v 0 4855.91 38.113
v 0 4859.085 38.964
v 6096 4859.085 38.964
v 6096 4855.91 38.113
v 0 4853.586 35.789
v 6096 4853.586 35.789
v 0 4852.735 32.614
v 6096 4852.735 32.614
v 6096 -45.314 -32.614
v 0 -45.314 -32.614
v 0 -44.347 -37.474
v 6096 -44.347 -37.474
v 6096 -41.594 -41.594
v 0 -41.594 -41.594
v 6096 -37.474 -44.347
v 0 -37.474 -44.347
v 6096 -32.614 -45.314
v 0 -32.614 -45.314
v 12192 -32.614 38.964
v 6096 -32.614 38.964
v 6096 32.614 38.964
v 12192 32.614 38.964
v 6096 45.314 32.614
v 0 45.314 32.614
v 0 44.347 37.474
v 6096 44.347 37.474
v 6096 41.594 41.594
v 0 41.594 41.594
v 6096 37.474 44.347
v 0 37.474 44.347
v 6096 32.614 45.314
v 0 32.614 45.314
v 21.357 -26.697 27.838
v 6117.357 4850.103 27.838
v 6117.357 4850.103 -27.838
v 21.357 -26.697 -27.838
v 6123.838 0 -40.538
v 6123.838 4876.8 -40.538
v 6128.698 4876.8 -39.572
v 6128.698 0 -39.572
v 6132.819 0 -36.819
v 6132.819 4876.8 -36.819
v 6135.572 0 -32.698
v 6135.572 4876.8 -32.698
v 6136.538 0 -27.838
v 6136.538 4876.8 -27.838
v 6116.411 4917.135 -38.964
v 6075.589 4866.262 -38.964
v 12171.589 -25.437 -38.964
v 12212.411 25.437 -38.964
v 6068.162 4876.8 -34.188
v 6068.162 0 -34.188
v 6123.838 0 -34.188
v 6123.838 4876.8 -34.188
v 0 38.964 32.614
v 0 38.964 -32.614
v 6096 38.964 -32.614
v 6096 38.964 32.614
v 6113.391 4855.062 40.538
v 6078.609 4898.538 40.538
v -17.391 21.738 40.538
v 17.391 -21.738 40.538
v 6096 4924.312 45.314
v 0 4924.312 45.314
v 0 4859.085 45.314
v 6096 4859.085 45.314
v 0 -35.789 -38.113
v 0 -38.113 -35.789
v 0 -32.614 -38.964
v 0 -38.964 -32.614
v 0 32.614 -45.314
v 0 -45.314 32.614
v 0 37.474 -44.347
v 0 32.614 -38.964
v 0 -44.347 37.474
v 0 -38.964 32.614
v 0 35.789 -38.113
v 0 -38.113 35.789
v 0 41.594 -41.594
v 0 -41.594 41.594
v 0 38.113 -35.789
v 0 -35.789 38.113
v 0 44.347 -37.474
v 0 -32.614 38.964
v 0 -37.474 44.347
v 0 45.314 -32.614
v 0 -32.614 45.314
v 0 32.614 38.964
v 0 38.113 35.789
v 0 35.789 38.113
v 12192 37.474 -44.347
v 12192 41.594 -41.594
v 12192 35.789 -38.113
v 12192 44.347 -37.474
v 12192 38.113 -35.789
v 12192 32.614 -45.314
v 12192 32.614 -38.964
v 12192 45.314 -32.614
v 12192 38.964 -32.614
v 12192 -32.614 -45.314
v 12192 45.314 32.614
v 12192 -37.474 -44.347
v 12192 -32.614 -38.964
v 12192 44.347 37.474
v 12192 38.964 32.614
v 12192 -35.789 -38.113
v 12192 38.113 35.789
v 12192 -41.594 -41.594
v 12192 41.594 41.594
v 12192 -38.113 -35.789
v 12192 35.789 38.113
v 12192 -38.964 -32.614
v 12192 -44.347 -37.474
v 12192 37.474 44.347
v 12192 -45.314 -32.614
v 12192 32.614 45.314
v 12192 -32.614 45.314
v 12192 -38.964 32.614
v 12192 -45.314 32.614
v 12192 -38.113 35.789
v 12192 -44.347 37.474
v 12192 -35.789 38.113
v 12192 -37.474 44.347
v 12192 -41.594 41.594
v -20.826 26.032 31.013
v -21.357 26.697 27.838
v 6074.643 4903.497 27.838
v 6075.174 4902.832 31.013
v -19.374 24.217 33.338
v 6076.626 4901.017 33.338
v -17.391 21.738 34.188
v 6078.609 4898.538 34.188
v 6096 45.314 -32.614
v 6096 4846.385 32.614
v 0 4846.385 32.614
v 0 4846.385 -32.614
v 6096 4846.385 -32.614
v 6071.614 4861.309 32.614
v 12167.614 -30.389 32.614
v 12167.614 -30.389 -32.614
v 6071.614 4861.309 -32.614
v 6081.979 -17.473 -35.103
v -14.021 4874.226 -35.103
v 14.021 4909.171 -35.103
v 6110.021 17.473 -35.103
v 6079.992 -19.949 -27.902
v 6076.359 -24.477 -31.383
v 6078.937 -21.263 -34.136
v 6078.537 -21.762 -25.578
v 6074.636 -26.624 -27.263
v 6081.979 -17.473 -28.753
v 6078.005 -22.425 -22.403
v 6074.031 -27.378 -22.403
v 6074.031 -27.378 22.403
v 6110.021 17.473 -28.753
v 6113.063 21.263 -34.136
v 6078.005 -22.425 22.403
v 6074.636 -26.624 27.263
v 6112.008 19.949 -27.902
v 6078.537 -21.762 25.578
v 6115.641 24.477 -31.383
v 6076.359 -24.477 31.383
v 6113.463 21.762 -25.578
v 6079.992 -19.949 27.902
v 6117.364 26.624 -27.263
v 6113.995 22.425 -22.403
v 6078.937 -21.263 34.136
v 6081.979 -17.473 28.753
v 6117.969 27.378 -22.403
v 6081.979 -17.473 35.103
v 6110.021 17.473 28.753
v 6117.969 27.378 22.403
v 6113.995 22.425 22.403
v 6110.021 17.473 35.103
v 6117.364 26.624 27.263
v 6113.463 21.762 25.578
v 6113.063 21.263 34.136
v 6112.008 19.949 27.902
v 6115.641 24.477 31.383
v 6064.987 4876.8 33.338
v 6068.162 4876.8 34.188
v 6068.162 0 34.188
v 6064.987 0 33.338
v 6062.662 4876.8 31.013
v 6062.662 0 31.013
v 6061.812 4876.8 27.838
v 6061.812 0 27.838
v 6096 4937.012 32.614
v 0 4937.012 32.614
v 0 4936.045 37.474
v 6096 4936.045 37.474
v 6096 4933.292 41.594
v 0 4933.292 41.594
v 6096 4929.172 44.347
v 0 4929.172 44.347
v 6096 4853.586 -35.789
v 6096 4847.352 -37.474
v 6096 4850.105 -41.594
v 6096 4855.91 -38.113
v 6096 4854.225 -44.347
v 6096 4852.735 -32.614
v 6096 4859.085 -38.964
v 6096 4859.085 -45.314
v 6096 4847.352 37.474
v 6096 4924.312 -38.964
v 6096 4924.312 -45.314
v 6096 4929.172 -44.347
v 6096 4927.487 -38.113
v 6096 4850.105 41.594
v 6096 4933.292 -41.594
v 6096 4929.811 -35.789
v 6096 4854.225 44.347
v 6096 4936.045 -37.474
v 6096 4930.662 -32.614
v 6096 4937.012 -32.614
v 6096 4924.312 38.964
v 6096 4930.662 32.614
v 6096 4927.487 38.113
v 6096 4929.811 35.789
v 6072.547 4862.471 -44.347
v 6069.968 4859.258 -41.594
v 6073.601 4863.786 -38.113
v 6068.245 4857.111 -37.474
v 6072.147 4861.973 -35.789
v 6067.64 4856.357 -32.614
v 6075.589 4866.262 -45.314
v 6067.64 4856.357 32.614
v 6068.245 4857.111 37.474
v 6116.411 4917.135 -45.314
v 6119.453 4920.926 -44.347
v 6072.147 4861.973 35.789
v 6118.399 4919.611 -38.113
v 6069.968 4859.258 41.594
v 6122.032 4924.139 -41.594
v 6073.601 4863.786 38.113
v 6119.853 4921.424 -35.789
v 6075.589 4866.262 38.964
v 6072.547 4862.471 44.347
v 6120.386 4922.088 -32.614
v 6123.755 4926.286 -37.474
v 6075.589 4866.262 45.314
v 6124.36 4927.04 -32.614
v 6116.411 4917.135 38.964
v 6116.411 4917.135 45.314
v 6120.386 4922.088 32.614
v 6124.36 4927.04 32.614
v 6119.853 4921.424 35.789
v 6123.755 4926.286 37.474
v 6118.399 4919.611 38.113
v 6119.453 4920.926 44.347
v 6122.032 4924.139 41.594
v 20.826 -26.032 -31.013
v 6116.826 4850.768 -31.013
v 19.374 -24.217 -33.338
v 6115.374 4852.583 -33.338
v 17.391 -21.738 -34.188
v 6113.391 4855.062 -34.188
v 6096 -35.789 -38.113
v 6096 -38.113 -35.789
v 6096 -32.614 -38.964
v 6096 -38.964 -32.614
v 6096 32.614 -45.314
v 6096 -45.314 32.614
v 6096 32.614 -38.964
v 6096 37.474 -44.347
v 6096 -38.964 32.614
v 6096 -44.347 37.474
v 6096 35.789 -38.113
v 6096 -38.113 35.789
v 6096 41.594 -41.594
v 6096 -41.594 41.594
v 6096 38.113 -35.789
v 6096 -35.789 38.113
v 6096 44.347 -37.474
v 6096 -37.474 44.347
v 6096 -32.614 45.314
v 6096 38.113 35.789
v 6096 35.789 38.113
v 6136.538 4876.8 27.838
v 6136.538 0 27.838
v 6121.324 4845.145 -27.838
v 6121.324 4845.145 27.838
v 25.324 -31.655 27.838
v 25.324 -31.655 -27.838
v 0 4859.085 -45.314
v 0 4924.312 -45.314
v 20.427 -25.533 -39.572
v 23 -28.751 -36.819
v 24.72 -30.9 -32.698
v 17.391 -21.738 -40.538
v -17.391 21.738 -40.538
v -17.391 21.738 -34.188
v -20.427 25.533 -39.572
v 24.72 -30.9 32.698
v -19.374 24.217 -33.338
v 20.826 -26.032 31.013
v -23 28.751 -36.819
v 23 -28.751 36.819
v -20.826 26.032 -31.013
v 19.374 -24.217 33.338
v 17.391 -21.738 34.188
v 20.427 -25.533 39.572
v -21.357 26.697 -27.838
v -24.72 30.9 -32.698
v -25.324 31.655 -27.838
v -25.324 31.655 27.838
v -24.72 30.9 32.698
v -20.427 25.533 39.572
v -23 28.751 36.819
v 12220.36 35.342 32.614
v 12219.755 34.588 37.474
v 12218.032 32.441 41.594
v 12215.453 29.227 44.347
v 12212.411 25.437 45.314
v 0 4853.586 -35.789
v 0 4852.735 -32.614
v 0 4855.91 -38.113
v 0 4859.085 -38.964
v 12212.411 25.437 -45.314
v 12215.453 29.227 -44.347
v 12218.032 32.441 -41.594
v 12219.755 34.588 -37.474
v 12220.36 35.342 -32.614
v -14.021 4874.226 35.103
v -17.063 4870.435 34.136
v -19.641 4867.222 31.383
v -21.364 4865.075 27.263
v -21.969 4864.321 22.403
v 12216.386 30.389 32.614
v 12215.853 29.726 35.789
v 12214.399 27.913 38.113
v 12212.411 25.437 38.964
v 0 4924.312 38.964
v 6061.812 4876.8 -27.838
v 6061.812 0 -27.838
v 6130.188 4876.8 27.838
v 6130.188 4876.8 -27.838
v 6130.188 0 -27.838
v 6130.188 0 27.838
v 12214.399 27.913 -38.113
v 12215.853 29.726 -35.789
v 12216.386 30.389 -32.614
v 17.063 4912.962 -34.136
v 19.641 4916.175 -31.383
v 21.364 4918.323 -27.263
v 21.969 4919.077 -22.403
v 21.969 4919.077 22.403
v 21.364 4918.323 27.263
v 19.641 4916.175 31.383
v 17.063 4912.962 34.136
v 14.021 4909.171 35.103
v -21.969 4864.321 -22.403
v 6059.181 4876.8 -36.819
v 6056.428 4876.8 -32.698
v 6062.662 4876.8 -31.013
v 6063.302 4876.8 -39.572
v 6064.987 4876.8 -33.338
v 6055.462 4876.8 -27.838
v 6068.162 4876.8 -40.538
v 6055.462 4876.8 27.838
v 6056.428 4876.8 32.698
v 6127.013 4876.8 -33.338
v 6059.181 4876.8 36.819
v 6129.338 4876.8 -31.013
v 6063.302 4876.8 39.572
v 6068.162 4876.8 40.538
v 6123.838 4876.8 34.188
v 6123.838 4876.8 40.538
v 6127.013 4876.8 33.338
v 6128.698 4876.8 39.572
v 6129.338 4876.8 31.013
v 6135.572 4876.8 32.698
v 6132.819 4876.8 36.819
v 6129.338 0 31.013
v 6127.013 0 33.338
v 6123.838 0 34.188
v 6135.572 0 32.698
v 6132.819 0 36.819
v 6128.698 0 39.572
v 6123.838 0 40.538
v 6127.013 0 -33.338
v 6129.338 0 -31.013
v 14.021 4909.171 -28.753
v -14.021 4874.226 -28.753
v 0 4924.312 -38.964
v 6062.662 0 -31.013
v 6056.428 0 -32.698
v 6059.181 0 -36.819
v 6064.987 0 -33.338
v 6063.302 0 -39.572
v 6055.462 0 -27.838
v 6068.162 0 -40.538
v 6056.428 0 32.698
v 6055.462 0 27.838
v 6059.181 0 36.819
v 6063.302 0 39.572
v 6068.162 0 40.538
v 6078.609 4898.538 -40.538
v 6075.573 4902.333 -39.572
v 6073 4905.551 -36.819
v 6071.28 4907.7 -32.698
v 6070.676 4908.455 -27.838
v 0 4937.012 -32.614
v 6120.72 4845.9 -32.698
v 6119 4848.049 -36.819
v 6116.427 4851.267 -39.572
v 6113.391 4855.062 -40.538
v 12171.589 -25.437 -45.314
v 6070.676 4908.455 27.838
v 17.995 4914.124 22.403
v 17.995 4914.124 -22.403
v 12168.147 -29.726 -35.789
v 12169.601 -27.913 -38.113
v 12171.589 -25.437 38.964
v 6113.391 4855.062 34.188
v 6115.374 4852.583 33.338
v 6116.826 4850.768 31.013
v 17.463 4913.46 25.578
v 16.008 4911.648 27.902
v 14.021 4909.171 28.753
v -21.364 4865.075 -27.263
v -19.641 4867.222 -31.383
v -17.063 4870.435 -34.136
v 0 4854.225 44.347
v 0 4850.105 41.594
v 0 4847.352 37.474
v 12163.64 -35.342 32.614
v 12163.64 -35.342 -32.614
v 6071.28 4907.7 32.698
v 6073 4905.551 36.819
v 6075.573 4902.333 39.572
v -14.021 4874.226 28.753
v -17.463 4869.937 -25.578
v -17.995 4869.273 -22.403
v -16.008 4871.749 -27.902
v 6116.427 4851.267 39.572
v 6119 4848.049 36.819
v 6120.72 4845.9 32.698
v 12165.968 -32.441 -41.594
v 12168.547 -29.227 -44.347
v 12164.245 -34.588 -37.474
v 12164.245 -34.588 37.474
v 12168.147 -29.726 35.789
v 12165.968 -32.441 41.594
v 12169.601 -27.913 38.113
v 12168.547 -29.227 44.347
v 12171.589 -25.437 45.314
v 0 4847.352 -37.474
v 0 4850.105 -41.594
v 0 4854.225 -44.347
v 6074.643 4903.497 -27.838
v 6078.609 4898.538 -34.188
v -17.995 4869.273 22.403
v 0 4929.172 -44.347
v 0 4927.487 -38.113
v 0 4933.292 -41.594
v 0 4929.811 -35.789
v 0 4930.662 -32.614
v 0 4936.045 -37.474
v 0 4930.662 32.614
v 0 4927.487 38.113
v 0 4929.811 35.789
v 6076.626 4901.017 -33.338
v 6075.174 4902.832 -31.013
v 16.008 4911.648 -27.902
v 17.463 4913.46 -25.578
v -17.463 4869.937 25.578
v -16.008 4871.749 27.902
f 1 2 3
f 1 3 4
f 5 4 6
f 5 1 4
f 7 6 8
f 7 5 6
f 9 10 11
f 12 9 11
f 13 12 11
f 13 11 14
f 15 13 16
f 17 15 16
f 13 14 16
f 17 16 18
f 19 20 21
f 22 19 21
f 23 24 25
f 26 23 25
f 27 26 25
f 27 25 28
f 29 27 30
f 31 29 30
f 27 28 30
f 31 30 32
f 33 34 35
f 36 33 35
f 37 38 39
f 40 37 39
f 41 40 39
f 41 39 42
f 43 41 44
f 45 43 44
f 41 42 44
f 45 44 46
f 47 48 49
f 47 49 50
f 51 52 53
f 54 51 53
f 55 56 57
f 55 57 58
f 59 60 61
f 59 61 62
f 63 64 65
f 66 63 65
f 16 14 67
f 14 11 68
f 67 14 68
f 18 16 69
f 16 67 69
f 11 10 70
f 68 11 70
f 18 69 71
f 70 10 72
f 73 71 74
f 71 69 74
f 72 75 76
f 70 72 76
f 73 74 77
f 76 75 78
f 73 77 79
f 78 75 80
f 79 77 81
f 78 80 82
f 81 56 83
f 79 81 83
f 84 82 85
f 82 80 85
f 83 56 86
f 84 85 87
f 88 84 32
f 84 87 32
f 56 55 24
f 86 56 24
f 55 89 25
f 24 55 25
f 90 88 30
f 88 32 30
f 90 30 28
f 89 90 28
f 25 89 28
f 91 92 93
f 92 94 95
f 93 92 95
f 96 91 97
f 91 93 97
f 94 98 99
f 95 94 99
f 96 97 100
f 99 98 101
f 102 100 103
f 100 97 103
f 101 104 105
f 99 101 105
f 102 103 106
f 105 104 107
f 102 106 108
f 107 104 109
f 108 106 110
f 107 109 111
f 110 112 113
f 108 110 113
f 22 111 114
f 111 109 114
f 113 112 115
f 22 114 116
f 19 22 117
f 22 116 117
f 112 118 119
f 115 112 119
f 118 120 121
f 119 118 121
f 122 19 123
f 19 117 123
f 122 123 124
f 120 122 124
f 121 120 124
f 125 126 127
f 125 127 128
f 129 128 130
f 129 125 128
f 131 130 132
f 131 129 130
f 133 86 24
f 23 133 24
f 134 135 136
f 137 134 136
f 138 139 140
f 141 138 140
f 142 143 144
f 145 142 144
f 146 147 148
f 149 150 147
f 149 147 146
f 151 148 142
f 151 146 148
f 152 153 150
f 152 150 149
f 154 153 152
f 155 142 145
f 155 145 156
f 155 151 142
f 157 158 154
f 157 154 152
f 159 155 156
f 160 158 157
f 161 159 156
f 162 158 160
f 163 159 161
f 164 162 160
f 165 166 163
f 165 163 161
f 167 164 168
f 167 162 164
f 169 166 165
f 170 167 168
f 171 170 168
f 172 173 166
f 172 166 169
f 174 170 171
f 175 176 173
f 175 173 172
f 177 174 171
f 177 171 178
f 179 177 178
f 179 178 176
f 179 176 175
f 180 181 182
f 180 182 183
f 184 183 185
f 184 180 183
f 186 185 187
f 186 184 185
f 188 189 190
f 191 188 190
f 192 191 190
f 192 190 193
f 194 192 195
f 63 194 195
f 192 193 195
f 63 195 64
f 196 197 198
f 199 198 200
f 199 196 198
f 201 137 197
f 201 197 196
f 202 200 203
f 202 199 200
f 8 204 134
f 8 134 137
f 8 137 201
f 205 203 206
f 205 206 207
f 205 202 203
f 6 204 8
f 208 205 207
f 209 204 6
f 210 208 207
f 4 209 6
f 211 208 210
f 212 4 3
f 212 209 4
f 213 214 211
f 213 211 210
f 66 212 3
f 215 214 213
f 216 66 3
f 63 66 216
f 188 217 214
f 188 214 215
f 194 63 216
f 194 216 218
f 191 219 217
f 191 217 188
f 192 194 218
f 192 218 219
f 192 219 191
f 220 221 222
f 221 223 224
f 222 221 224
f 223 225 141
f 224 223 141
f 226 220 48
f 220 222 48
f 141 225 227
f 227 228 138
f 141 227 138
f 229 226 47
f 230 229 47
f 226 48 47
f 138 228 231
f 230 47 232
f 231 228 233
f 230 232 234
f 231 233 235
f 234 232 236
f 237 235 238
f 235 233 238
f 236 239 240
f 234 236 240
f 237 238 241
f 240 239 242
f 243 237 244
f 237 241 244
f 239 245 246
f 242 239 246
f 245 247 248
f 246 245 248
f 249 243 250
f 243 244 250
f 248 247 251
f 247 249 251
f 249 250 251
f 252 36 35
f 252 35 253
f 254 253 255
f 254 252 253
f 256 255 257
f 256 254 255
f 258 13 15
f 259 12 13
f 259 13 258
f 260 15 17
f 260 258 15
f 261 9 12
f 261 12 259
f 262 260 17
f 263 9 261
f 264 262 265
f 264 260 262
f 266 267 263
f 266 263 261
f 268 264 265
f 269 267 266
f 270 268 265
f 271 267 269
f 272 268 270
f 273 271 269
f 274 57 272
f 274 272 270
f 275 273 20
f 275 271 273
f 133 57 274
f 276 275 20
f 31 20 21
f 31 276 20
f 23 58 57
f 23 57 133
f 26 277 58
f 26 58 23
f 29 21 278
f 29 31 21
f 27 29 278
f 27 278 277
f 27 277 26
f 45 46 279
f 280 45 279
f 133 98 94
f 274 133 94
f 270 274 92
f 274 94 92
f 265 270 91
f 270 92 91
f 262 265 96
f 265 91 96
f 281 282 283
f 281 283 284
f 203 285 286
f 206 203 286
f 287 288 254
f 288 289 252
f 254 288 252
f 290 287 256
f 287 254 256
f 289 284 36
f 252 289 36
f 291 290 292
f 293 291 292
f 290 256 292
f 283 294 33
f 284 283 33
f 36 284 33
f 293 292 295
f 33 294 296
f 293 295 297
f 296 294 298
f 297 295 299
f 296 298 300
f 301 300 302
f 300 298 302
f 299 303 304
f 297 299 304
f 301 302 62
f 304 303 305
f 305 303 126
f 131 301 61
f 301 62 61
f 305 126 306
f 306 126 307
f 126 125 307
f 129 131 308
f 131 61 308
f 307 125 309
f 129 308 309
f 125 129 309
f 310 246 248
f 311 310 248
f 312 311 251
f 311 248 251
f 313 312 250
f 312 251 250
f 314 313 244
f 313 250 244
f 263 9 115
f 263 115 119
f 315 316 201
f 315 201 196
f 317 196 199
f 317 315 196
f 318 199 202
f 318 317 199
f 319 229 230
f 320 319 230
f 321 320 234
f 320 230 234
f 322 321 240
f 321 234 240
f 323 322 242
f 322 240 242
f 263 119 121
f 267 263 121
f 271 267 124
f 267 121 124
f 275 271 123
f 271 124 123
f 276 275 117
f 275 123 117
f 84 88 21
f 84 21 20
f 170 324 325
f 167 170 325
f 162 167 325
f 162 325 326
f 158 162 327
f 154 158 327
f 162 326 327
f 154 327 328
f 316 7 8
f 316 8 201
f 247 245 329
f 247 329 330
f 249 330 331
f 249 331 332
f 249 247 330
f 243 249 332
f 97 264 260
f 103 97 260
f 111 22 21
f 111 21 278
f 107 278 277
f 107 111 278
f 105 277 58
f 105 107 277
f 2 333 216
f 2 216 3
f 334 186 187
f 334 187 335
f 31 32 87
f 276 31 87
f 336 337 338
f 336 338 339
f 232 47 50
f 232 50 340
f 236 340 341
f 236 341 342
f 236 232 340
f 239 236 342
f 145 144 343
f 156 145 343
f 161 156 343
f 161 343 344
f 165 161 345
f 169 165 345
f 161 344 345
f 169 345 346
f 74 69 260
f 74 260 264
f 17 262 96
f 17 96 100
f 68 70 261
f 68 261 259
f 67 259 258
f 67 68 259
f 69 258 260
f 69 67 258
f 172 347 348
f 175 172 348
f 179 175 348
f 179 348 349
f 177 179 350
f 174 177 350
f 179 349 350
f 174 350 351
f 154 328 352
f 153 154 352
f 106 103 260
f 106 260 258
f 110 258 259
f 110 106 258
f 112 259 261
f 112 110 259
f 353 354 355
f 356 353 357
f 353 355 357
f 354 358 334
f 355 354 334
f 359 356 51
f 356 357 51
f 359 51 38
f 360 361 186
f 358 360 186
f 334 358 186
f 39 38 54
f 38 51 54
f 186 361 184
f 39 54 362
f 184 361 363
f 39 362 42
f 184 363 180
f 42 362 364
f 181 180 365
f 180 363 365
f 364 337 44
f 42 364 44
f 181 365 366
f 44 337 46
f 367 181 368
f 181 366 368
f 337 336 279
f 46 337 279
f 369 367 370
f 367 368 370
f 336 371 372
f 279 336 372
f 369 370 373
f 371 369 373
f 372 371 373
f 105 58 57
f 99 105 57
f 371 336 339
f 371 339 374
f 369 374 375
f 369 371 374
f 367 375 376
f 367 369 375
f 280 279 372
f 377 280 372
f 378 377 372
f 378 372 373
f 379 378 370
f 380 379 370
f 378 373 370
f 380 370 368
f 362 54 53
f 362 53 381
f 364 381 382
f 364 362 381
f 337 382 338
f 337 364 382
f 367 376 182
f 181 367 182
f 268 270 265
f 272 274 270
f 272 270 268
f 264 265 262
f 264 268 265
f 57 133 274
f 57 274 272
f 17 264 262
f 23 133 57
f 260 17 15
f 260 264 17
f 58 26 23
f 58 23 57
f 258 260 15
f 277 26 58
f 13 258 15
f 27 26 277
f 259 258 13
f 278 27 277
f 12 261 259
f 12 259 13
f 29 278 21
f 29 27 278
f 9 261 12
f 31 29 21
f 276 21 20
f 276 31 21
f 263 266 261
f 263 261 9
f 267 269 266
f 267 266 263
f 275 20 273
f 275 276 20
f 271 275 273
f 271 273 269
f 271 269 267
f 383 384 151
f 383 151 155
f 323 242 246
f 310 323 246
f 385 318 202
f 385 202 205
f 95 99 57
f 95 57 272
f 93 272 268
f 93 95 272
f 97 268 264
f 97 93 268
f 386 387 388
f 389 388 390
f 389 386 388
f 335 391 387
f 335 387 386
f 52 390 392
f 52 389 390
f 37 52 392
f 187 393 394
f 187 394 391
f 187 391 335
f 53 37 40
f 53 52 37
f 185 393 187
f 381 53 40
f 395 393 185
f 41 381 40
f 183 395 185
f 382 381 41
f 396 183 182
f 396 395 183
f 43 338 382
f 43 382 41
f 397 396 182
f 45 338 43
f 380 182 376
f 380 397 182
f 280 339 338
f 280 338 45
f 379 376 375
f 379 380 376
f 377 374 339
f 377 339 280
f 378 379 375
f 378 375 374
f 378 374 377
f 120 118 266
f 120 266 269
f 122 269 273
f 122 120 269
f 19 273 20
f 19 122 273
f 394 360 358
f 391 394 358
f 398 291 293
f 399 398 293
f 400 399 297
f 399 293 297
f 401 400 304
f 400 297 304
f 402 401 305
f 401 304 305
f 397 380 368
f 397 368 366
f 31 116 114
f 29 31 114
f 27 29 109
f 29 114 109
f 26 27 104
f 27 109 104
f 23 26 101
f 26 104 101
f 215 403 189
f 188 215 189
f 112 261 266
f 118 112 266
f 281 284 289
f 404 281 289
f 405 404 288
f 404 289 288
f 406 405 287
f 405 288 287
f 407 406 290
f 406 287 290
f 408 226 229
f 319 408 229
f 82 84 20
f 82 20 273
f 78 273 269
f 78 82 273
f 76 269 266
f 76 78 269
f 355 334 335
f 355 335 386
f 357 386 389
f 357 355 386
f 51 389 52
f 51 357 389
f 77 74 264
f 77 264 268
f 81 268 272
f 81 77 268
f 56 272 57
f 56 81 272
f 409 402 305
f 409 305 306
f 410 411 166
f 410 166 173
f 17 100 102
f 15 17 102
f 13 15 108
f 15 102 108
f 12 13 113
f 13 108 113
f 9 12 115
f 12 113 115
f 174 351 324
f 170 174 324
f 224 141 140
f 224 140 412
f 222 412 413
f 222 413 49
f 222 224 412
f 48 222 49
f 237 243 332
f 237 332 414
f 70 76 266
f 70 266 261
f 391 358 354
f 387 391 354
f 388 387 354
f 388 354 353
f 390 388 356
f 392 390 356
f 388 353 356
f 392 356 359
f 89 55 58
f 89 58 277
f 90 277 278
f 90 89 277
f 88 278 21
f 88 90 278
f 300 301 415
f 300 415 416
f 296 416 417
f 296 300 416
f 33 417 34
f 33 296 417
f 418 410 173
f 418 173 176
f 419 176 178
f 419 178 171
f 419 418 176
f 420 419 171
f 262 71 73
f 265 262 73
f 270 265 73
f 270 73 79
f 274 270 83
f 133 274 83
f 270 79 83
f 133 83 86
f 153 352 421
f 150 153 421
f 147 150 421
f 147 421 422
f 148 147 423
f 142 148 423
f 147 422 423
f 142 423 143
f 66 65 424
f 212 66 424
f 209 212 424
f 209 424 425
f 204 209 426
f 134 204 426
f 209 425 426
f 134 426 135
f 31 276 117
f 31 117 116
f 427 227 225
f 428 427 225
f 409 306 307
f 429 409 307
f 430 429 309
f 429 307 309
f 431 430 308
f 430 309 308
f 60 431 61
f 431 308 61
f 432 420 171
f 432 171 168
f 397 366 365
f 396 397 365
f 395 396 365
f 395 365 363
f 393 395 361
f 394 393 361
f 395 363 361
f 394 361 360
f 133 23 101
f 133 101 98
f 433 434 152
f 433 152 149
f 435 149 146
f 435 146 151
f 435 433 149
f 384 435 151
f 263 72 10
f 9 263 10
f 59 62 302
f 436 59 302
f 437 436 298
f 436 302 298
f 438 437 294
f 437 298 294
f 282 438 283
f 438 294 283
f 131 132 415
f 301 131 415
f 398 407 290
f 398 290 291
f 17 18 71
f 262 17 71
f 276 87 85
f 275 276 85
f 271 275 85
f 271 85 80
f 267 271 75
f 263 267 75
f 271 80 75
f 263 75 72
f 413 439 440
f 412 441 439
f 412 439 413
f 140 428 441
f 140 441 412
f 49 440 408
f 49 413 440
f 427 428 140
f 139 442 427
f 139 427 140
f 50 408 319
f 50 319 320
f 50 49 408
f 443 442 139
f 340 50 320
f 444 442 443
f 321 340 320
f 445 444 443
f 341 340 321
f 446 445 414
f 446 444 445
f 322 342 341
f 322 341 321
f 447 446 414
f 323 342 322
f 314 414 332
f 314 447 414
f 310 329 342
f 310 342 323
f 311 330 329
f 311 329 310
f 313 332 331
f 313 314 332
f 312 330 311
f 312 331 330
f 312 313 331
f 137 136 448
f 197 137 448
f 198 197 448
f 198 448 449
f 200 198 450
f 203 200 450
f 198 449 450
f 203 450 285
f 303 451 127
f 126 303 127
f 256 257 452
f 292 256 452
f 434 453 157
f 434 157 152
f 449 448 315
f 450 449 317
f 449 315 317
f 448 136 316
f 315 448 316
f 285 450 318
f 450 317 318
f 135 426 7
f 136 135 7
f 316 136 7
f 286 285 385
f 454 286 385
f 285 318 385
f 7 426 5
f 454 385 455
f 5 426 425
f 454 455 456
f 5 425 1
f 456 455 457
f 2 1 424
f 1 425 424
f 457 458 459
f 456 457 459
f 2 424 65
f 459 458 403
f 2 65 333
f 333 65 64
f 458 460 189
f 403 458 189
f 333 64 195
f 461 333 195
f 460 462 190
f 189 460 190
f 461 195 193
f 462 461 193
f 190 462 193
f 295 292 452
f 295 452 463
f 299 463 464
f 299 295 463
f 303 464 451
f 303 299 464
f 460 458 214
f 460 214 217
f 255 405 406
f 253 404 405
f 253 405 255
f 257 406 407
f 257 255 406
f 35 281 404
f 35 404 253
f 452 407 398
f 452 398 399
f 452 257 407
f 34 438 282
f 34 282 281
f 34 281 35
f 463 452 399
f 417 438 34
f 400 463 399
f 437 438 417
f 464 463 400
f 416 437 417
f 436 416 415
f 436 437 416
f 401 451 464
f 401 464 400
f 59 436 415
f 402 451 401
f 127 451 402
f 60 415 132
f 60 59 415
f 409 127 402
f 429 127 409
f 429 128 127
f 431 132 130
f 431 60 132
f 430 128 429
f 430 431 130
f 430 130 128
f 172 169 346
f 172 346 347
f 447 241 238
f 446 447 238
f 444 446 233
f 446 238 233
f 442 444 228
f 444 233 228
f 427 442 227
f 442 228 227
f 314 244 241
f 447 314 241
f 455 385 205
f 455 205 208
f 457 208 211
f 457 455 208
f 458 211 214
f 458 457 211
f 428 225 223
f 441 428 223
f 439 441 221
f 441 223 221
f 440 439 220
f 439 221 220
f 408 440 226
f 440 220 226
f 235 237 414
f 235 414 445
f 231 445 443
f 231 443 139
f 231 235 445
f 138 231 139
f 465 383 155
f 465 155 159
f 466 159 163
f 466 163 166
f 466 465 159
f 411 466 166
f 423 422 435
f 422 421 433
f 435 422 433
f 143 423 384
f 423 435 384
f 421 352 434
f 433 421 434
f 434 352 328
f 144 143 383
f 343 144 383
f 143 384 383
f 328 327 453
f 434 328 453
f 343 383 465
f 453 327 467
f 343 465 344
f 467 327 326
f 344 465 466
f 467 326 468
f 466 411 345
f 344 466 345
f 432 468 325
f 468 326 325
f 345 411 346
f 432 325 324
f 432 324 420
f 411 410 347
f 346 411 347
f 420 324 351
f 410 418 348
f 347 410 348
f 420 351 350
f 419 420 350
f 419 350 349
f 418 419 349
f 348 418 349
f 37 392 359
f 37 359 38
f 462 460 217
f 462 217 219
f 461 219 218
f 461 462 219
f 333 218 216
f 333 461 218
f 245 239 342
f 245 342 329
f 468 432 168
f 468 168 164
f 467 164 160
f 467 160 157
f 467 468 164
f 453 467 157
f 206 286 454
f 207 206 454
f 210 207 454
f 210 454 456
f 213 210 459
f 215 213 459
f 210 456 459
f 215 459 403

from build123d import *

# Parameters (mm, degrees)
ELEMENT_1_DEPTH = 6096
ELEMENT_2_DEPTH = 6096
ELEMENT_3_DEPTH = 6096
ELEMENT_4_DEPTH = 7806.689070278
ELEMENT_5_DEPTH = 7816.00479415
ELEMENT_6_DEPTH = 4876.8
ELEMENT_7_DEPTH = 7816.00479415


with BuildPart() as part:
    # Sketch13 → element 1 (new body)
    with BuildSketch(Plane.YZ):
        with BuildLine():
            Line((-32.6136, -45.3136), (32.6136, -45.3136))
            ThreePointArc((32.6136, -45.3136), (41.593856121, -41.593856121), (45.3136, -32.6136))
            Line((45.3136, -32.6136), (45.3136, 32.6136))
            ThreePointArc((45.3136, 32.6136), (41.593856121, 41.593856121), (32.6136, 45.3136))
            Line((32.6136, 45.3136), (-32.6136, 45.3136))
            ThreePointArc((-32.6136, 45.3136), (-41.593856121, 41.593856121), (-45.3136, 32.6136))
            Line((-45.3136, 32.6136), (-45.3136, -32.6136))
            ThreePointArc((-45.3136, -32.6136), (-41.593856121, -41.593856121), (-32.6136, -45.3136))
        make_face()
        with BuildLine():
            Line((-32.6136, -38.9636), (32.6136, -38.9636))
            ThreePointArc((32.6136, -38.9636), (37.103728061, -37.103728061), (38.9636, -32.6136))
            Line((38.9636, -32.6136), (38.9636, 32.6136))
            ThreePointArc((38.9636, 32.6136), (37.103728061, 37.103728061), (32.6136, 38.9636))
            Line((32.6136, 38.9636), (-32.6136, 38.9636))
            ThreePointArc((-32.6136, 38.9636), (-37.103728061, 37.103728061), (-38.9636, 32.6136))
            Line((-38.9636, 32.6136), (-38.9636, -32.6136))
            ThreePointArc((-38.9636, -32.6136), (-37.103728061, -37.103728061), (-32.6136, -38.9636))
        make_face(mode=Mode.SUBTRACT)
    extrude(amount=ELEMENT_1_DEPTH)


with BuildPart() as body_2:
    # Sketch15 → element 2 (new body)
    with BuildSketch(Plane(origin=(12192, 0, 0), x_dir=(0, -1, 0), z_dir=(-1, 0, 0))):
        with BuildLine():
            Line((-32.6136, -45.3136), (32.6136, -45.3136))
            ThreePointArc((32.6136, -45.3136), (41.593856121, -41.593856121), (45.3136, -32.6136))
            Line((45.3136, -32.6136), (45.3136, 32.6136))
            ThreePointArc((45.3136, 32.6136), (41.593856121, 41.593856121), (32.6136, 45.3136))
            Line((32.6136, 45.3136), (-32.6136, 45.3136))
            ThreePointArc((-32.6136, 45.3136), (-41.593856121, 41.593856121), (-45.3136, 32.6136))
            Line((-45.3136, 32.6136), (-45.3136, -32.6136))
            ThreePointArc((-45.3136, -32.6136), (-41.593856121, -41.593856121), (-32.6136, -45.3136))
        make_face()
        with BuildLine():
            Line((-32.6136, -38.9636), (32.6136, -38.9636))
            ThreePointArc((32.6136, -38.9636), (37.103728061, -37.103728061), (38.9636, -32.6136))
            Line((38.9636, -32.6136), (38.9636, 32.6136))
            ThreePointArc((38.9636, 32.6136), (37.103728061, 37.103728061), (32.6136, 38.9636))
            Line((32.6136, 38.9636), (-32.6136, 38.9636))
            ThreePointArc((-32.6136, 38.9636), (-37.103728061, 37.103728061), (-38.9636, 32.6136))
            Line((-38.9636, 32.6136), (-38.9636, -32.6136))
            ThreePointArc((-38.9636, -32.6136), (-37.103728061, -37.103728061), (-32.6136, -38.9636))
        make_face(mode=Mode.SUBTRACT)
    extrude(amount=ELEMENT_2_DEPTH)


with BuildPart() as body_3:
    # Sketch17 → element 3 (new body)
    with BuildSketch(Plane(origin=(0, 4891.698574338, 0), x_dir=(0, 1, 0), z_dir=(1, 0, 0))):
        with BuildLine():
            Line((-32.6136, -45.3136), (32.6136, -45.3136))
            ThreePointArc((32.6136, -45.3136), (41.593856121, -41.593856121), (45.3136, -32.6136))
            Line((45.3136, -32.6136), (45.3136, 32.6136))
            ThreePointArc((45.3136, 32.6136), (41.593856121, 41.593856121), (32.6136, 45.3136))
            Line((32.6136, 45.3136), (-32.6136, 45.3136))
            ThreePointArc((-32.6136, 45.3136), (-41.593856121, 41.593856121), (-45.3136, 32.6136))
            Line((-45.3136, 32.6136), (-45.3136, -32.6136))
            ThreePointArc((-45.3136, -32.6136), (-41.593856121, -41.593856121), (-32.6136, -45.3136))
        make_face()
        with BuildLine():
            Line((-32.6136, -38.9636), (32.6136, -38.9636))
            ThreePointArc((32.6136, -38.9636), (37.103728061, -37.103728061), (38.9636, -32.6136))
            Line((38.9636, -32.6136), (38.9636, 32.6136))
            ThreePointArc((38.9636, 32.6136), (37.103728061, 37.103728061), (32.6136, 38.9636))
            Line((32.6136, 38.9636), (-32.6136, 38.9636))
            ThreePointArc((-32.6136, 38.9636), (-37.103728061, 37.103728061), (-38.9636, 32.6136))
            Line((-38.9636, 32.6136), (-38.9636, -32.6136))
            ThreePointArc((-38.9636, -32.6136), (-37.103728061, -37.103728061), (-32.6136, -38.9636))
        make_face(mode=Mode.SUBTRACT)
    extrude(amount=ELEMENT_3_DEPTH)


with BuildPart() as body_4:
    # Sketch19 → element 4 (new body)
    with BuildSketch(Plane(origin=(0, 0, 0), x_dir=(-0.6246950475544243, 0.7808688094430304, 0), z_dir=(0.7808688094430304, 0.6246950475544243, 0))):
        with BuildLine():
            Line((-27.8384, -40.5384), (27.8384, -40.5384))
            ThreePointArc((27.8384, -40.5384), (36.818656121, -36.818656121), (40.5384, -27.8384))
            Line((40.5384, -27.8384), (40.5384, 27.8384))
            ThreePointArc((40.5384, 27.8384), (36.818656121, 36.818656121), (27.8384, 40.5384))
            Line((27.8384, 40.5384), (-27.8384, 40.5384))
            ThreePointArc((-27.8384, 40.5384), (-36.818656121, 36.818656121), (-40.5384, 27.8384))
            Line((-40.5384, 27.8384), (-40.5384, -27.8384))
            ThreePointArc((-40.5384, -27.8384), (-36.818656121, -36.818656121), (-27.8384, -40.5384))
        make_face()
        with BuildLine():
            Line((-27.8384, -34.1884), (27.8384, -34.1884))
            ThreePointArc((27.8384, -34.1884), (32.328528061, -32.328528061), (34.1884, -27.8384))
            Line((34.1884, -27.8384), (34.1884, 27.8384))
            ThreePointArc((34.1884, 27.8384), (32.328528061, 32.328528061), (27.8384, 34.1884))
            Line((27.8384, 34.1884), (-27.8384, 34.1884))
            ThreePointArc((-27.8384, 34.1884), (-32.328528061, 32.328528061), (-34.1884, 27.8384))
            Line((-34.1884, 27.8384), (-34.1884, -27.8384))
            ThreePointArc((-34.1884, -27.8384), (-32.328528061, -32.328528061), (-27.8384, -34.1884))
        make_face(mode=Mode.SUBTRACT)
    extrude(amount=ELEMENT_4_DEPTH)


with BuildPart() as body_5:
    # Sketch18 → element 5 (new body)
    with BuildSketch(Plane(origin=(0, 4891.698574338, 0), x_dir=(0.625856649678507, 0.779938109117124, 0), z_dir=(0.779938109117124, -0.625856649678507, 0))):
        with BuildLine():
            Line((-22.4028, -35.1028), (22.4028, -35.1028))
            ThreePointArc((22.4028, -35.1028), (31.383056121, -31.383056121), (35.1028, -22.4028))
            Line((35.1028, -22.4028), (35.1028, 22.4028))
            ThreePointArc((35.1028, 22.4028), (31.383056121, 31.383056121), (22.4028, 35.1028))
            Line((22.4028, 35.1028), (-22.4028, 35.1028))
            ThreePointArc((-22.4028, 35.1028), (-31.383056121, 31.383056121), (-35.1028, 22.4028))
            Line((-35.1028, 22.4028), (-35.1028, -22.4028))
            ThreePointArc((-35.1028, -22.4028), (-31.383056121, -31.383056121), (-22.4028, -35.1028))
        make_face()
        with BuildLine():
            Line((-22.4028, -28.7528), (22.4028, -28.7528))
            ThreePointArc((22.4028, -28.7528), (26.892928061, -26.892928061), (28.7528, -22.4028))
            Line((28.7528, -22.4028), (28.7528, 22.4028))
            ThreePointArc((28.7528, 22.4028), (26.892928061, 26.892928061), (22.4028, 28.7528))
            Line((22.4028, 28.7528), (-22.4028, 28.7528))
            ThreePointArc((-22.4028, 28.7528), (-26.892928061, 26.892928061), (-28.7528, 22.4028))
            Line((-28.7528, 22.4028), (-28.7528, -22.4028))
            ThreePointArc((-28.7528, -22.4028), (-26.892928061, -26.892928061), (-22.4028, -28.7528))
        make_face(mode=Mode.SUBTRACT)
    extrude(amount=ELEMENT_5_DEPTH)


with BuildPart() as body_6:
    # Sketch110 → element 6 (new body)
    with BuildSketch(Plane(origin=(6096, 4876.8, 0), x_dir=(1, 0, 0), z_dir=(0, -1, 0))):
        with BuildLine():
            Line((-27.8384, -40.5384), (27.8384, -40.5384))
            ThreePointArc((27.8384, -40.5384), (36.818656121, -36.818656121), (40.5384, -27.8384))
            Line((40.5384, -27.8384), (40.5384, 27.8384))
            ThreePointArc((40.5384, 27.8384), (36.818656121, 36.818656121), (27.8384, 40.5384))
            Line((27.8384, 40.5384), (-27.8384, 40.5384))
            ThreePointArc((-27.8384, 40.5384), (-36.818656121, 36.818656121), (-40.5384, 27.8384))
            Line((-40.5384, 27.8384), (-40.5384, -27.8384))
            ThreePointArc((-40.5384, -27.8384), (-36.818656121, -36.818656121), (-27.8384, -40.5384))
        make_face()
        with BuildLine():
            Line((-27.8384, -34.1884), (27.8384, -34.1884))
            ThreePointArc((27.8384, -34.1884), (32.328528061, -32.328528061), (34.1884, -27.8384))
            Line((34.1884, -27.8384), (34.1884, 27.8384))
            ThreePointArc((34.1884, 27.8384), (32.328528061, 32.328528061), (27.8384, 34.1884))
            Line((27.8384, 34.1884), (-27.8384, 34.1884))
            ThreePointArc((-27.8384, 34.1884), (-32.328528061, 32.328528061), (-34.1884, 27.8384))
            Line((-34.1884, 27.8384), (-34.1884, -27.8384))
            ThreePointArc((-34.1884, -27.8384), (-32.328528061, -32.328528061), (-27.8384, -34.1884))
        make_face(mode=Mode.SUBTRACT)
    extrude(amount=ELEMENT_6_DEPTH)


with BuildPart() as body_7:
    # Sketch16 → element 7 (new body)
    with BuildSketch(Plane(origin=(6096, 4891.698574338, 0), x_dir=(0.625856649678507, 0.779938109117124, 0), z_dir=(0.779938109117124, -0.625856649678507, 0))):
        with BuildLine():
            Line((-32.6136, -45.3136), (32.6136, -45.3136))
            ThreePointArc((32.6136, -45.3136), (41.593856121, -41.593856121), (45.3136, -32.6136))
            Line((45.3136, -32.6136), (45.3136, 32.6136))
            ThreePointArc((45.3136, 32.6136), (41.593856121, 41.593856121), (32.6136, 45.3136))
            Line((32.6136, 45.3136), (-32.6136, 45.3136))
            ThreePointArc((-32.6136, 45.3136), (-41.593856121, 41.593856121), (-45.3136, 32.6136))
            Line((-45.3136, 32.6136), (-45.3136, -32.6136))
            ThreePointArc((-45.3136, -32.6136), (-41.593856121, -41.593856121), (-32.6136, -45.3136))
        make_face()
        with BuildLine():
            Line((-32.6136, -38.9636), (32.6136, -38.9636))
            ThreePointArc((32.6136, -38.9636), (37.103728061, -37.103728061), (38.9636, -32.6136))
            Line((38.9636, -32.6136), (38.9636, 32.6136))
            ThreePointArc((38.9636, 32.6136), (37.103728061, 37.103728061), (32.6136, 38.9636))
            Line((32.6136, 38.9636), (-32.6136, 38.9636))
            ThreePointArc((-32.6136, 38.9636), (-37.103728061, 37.103728061), (-38.9636, 32.6136))
            Line((-38.9636, 32.6136), (-38.9636, -32.6136))
            ThreePointArc((-38.9636, -32.6136), (-37.103728061, -37.103728061), (-32.6136, -38.9636))
        make_face(mode=Mode.SUBTRACT)
    extrude(amount=ELEMENT_7_DEPTH)


solid = Compound([part.part, body_2.part, body_3.part, body_4.part, body_5.part, body_6.part, body_7.part])
